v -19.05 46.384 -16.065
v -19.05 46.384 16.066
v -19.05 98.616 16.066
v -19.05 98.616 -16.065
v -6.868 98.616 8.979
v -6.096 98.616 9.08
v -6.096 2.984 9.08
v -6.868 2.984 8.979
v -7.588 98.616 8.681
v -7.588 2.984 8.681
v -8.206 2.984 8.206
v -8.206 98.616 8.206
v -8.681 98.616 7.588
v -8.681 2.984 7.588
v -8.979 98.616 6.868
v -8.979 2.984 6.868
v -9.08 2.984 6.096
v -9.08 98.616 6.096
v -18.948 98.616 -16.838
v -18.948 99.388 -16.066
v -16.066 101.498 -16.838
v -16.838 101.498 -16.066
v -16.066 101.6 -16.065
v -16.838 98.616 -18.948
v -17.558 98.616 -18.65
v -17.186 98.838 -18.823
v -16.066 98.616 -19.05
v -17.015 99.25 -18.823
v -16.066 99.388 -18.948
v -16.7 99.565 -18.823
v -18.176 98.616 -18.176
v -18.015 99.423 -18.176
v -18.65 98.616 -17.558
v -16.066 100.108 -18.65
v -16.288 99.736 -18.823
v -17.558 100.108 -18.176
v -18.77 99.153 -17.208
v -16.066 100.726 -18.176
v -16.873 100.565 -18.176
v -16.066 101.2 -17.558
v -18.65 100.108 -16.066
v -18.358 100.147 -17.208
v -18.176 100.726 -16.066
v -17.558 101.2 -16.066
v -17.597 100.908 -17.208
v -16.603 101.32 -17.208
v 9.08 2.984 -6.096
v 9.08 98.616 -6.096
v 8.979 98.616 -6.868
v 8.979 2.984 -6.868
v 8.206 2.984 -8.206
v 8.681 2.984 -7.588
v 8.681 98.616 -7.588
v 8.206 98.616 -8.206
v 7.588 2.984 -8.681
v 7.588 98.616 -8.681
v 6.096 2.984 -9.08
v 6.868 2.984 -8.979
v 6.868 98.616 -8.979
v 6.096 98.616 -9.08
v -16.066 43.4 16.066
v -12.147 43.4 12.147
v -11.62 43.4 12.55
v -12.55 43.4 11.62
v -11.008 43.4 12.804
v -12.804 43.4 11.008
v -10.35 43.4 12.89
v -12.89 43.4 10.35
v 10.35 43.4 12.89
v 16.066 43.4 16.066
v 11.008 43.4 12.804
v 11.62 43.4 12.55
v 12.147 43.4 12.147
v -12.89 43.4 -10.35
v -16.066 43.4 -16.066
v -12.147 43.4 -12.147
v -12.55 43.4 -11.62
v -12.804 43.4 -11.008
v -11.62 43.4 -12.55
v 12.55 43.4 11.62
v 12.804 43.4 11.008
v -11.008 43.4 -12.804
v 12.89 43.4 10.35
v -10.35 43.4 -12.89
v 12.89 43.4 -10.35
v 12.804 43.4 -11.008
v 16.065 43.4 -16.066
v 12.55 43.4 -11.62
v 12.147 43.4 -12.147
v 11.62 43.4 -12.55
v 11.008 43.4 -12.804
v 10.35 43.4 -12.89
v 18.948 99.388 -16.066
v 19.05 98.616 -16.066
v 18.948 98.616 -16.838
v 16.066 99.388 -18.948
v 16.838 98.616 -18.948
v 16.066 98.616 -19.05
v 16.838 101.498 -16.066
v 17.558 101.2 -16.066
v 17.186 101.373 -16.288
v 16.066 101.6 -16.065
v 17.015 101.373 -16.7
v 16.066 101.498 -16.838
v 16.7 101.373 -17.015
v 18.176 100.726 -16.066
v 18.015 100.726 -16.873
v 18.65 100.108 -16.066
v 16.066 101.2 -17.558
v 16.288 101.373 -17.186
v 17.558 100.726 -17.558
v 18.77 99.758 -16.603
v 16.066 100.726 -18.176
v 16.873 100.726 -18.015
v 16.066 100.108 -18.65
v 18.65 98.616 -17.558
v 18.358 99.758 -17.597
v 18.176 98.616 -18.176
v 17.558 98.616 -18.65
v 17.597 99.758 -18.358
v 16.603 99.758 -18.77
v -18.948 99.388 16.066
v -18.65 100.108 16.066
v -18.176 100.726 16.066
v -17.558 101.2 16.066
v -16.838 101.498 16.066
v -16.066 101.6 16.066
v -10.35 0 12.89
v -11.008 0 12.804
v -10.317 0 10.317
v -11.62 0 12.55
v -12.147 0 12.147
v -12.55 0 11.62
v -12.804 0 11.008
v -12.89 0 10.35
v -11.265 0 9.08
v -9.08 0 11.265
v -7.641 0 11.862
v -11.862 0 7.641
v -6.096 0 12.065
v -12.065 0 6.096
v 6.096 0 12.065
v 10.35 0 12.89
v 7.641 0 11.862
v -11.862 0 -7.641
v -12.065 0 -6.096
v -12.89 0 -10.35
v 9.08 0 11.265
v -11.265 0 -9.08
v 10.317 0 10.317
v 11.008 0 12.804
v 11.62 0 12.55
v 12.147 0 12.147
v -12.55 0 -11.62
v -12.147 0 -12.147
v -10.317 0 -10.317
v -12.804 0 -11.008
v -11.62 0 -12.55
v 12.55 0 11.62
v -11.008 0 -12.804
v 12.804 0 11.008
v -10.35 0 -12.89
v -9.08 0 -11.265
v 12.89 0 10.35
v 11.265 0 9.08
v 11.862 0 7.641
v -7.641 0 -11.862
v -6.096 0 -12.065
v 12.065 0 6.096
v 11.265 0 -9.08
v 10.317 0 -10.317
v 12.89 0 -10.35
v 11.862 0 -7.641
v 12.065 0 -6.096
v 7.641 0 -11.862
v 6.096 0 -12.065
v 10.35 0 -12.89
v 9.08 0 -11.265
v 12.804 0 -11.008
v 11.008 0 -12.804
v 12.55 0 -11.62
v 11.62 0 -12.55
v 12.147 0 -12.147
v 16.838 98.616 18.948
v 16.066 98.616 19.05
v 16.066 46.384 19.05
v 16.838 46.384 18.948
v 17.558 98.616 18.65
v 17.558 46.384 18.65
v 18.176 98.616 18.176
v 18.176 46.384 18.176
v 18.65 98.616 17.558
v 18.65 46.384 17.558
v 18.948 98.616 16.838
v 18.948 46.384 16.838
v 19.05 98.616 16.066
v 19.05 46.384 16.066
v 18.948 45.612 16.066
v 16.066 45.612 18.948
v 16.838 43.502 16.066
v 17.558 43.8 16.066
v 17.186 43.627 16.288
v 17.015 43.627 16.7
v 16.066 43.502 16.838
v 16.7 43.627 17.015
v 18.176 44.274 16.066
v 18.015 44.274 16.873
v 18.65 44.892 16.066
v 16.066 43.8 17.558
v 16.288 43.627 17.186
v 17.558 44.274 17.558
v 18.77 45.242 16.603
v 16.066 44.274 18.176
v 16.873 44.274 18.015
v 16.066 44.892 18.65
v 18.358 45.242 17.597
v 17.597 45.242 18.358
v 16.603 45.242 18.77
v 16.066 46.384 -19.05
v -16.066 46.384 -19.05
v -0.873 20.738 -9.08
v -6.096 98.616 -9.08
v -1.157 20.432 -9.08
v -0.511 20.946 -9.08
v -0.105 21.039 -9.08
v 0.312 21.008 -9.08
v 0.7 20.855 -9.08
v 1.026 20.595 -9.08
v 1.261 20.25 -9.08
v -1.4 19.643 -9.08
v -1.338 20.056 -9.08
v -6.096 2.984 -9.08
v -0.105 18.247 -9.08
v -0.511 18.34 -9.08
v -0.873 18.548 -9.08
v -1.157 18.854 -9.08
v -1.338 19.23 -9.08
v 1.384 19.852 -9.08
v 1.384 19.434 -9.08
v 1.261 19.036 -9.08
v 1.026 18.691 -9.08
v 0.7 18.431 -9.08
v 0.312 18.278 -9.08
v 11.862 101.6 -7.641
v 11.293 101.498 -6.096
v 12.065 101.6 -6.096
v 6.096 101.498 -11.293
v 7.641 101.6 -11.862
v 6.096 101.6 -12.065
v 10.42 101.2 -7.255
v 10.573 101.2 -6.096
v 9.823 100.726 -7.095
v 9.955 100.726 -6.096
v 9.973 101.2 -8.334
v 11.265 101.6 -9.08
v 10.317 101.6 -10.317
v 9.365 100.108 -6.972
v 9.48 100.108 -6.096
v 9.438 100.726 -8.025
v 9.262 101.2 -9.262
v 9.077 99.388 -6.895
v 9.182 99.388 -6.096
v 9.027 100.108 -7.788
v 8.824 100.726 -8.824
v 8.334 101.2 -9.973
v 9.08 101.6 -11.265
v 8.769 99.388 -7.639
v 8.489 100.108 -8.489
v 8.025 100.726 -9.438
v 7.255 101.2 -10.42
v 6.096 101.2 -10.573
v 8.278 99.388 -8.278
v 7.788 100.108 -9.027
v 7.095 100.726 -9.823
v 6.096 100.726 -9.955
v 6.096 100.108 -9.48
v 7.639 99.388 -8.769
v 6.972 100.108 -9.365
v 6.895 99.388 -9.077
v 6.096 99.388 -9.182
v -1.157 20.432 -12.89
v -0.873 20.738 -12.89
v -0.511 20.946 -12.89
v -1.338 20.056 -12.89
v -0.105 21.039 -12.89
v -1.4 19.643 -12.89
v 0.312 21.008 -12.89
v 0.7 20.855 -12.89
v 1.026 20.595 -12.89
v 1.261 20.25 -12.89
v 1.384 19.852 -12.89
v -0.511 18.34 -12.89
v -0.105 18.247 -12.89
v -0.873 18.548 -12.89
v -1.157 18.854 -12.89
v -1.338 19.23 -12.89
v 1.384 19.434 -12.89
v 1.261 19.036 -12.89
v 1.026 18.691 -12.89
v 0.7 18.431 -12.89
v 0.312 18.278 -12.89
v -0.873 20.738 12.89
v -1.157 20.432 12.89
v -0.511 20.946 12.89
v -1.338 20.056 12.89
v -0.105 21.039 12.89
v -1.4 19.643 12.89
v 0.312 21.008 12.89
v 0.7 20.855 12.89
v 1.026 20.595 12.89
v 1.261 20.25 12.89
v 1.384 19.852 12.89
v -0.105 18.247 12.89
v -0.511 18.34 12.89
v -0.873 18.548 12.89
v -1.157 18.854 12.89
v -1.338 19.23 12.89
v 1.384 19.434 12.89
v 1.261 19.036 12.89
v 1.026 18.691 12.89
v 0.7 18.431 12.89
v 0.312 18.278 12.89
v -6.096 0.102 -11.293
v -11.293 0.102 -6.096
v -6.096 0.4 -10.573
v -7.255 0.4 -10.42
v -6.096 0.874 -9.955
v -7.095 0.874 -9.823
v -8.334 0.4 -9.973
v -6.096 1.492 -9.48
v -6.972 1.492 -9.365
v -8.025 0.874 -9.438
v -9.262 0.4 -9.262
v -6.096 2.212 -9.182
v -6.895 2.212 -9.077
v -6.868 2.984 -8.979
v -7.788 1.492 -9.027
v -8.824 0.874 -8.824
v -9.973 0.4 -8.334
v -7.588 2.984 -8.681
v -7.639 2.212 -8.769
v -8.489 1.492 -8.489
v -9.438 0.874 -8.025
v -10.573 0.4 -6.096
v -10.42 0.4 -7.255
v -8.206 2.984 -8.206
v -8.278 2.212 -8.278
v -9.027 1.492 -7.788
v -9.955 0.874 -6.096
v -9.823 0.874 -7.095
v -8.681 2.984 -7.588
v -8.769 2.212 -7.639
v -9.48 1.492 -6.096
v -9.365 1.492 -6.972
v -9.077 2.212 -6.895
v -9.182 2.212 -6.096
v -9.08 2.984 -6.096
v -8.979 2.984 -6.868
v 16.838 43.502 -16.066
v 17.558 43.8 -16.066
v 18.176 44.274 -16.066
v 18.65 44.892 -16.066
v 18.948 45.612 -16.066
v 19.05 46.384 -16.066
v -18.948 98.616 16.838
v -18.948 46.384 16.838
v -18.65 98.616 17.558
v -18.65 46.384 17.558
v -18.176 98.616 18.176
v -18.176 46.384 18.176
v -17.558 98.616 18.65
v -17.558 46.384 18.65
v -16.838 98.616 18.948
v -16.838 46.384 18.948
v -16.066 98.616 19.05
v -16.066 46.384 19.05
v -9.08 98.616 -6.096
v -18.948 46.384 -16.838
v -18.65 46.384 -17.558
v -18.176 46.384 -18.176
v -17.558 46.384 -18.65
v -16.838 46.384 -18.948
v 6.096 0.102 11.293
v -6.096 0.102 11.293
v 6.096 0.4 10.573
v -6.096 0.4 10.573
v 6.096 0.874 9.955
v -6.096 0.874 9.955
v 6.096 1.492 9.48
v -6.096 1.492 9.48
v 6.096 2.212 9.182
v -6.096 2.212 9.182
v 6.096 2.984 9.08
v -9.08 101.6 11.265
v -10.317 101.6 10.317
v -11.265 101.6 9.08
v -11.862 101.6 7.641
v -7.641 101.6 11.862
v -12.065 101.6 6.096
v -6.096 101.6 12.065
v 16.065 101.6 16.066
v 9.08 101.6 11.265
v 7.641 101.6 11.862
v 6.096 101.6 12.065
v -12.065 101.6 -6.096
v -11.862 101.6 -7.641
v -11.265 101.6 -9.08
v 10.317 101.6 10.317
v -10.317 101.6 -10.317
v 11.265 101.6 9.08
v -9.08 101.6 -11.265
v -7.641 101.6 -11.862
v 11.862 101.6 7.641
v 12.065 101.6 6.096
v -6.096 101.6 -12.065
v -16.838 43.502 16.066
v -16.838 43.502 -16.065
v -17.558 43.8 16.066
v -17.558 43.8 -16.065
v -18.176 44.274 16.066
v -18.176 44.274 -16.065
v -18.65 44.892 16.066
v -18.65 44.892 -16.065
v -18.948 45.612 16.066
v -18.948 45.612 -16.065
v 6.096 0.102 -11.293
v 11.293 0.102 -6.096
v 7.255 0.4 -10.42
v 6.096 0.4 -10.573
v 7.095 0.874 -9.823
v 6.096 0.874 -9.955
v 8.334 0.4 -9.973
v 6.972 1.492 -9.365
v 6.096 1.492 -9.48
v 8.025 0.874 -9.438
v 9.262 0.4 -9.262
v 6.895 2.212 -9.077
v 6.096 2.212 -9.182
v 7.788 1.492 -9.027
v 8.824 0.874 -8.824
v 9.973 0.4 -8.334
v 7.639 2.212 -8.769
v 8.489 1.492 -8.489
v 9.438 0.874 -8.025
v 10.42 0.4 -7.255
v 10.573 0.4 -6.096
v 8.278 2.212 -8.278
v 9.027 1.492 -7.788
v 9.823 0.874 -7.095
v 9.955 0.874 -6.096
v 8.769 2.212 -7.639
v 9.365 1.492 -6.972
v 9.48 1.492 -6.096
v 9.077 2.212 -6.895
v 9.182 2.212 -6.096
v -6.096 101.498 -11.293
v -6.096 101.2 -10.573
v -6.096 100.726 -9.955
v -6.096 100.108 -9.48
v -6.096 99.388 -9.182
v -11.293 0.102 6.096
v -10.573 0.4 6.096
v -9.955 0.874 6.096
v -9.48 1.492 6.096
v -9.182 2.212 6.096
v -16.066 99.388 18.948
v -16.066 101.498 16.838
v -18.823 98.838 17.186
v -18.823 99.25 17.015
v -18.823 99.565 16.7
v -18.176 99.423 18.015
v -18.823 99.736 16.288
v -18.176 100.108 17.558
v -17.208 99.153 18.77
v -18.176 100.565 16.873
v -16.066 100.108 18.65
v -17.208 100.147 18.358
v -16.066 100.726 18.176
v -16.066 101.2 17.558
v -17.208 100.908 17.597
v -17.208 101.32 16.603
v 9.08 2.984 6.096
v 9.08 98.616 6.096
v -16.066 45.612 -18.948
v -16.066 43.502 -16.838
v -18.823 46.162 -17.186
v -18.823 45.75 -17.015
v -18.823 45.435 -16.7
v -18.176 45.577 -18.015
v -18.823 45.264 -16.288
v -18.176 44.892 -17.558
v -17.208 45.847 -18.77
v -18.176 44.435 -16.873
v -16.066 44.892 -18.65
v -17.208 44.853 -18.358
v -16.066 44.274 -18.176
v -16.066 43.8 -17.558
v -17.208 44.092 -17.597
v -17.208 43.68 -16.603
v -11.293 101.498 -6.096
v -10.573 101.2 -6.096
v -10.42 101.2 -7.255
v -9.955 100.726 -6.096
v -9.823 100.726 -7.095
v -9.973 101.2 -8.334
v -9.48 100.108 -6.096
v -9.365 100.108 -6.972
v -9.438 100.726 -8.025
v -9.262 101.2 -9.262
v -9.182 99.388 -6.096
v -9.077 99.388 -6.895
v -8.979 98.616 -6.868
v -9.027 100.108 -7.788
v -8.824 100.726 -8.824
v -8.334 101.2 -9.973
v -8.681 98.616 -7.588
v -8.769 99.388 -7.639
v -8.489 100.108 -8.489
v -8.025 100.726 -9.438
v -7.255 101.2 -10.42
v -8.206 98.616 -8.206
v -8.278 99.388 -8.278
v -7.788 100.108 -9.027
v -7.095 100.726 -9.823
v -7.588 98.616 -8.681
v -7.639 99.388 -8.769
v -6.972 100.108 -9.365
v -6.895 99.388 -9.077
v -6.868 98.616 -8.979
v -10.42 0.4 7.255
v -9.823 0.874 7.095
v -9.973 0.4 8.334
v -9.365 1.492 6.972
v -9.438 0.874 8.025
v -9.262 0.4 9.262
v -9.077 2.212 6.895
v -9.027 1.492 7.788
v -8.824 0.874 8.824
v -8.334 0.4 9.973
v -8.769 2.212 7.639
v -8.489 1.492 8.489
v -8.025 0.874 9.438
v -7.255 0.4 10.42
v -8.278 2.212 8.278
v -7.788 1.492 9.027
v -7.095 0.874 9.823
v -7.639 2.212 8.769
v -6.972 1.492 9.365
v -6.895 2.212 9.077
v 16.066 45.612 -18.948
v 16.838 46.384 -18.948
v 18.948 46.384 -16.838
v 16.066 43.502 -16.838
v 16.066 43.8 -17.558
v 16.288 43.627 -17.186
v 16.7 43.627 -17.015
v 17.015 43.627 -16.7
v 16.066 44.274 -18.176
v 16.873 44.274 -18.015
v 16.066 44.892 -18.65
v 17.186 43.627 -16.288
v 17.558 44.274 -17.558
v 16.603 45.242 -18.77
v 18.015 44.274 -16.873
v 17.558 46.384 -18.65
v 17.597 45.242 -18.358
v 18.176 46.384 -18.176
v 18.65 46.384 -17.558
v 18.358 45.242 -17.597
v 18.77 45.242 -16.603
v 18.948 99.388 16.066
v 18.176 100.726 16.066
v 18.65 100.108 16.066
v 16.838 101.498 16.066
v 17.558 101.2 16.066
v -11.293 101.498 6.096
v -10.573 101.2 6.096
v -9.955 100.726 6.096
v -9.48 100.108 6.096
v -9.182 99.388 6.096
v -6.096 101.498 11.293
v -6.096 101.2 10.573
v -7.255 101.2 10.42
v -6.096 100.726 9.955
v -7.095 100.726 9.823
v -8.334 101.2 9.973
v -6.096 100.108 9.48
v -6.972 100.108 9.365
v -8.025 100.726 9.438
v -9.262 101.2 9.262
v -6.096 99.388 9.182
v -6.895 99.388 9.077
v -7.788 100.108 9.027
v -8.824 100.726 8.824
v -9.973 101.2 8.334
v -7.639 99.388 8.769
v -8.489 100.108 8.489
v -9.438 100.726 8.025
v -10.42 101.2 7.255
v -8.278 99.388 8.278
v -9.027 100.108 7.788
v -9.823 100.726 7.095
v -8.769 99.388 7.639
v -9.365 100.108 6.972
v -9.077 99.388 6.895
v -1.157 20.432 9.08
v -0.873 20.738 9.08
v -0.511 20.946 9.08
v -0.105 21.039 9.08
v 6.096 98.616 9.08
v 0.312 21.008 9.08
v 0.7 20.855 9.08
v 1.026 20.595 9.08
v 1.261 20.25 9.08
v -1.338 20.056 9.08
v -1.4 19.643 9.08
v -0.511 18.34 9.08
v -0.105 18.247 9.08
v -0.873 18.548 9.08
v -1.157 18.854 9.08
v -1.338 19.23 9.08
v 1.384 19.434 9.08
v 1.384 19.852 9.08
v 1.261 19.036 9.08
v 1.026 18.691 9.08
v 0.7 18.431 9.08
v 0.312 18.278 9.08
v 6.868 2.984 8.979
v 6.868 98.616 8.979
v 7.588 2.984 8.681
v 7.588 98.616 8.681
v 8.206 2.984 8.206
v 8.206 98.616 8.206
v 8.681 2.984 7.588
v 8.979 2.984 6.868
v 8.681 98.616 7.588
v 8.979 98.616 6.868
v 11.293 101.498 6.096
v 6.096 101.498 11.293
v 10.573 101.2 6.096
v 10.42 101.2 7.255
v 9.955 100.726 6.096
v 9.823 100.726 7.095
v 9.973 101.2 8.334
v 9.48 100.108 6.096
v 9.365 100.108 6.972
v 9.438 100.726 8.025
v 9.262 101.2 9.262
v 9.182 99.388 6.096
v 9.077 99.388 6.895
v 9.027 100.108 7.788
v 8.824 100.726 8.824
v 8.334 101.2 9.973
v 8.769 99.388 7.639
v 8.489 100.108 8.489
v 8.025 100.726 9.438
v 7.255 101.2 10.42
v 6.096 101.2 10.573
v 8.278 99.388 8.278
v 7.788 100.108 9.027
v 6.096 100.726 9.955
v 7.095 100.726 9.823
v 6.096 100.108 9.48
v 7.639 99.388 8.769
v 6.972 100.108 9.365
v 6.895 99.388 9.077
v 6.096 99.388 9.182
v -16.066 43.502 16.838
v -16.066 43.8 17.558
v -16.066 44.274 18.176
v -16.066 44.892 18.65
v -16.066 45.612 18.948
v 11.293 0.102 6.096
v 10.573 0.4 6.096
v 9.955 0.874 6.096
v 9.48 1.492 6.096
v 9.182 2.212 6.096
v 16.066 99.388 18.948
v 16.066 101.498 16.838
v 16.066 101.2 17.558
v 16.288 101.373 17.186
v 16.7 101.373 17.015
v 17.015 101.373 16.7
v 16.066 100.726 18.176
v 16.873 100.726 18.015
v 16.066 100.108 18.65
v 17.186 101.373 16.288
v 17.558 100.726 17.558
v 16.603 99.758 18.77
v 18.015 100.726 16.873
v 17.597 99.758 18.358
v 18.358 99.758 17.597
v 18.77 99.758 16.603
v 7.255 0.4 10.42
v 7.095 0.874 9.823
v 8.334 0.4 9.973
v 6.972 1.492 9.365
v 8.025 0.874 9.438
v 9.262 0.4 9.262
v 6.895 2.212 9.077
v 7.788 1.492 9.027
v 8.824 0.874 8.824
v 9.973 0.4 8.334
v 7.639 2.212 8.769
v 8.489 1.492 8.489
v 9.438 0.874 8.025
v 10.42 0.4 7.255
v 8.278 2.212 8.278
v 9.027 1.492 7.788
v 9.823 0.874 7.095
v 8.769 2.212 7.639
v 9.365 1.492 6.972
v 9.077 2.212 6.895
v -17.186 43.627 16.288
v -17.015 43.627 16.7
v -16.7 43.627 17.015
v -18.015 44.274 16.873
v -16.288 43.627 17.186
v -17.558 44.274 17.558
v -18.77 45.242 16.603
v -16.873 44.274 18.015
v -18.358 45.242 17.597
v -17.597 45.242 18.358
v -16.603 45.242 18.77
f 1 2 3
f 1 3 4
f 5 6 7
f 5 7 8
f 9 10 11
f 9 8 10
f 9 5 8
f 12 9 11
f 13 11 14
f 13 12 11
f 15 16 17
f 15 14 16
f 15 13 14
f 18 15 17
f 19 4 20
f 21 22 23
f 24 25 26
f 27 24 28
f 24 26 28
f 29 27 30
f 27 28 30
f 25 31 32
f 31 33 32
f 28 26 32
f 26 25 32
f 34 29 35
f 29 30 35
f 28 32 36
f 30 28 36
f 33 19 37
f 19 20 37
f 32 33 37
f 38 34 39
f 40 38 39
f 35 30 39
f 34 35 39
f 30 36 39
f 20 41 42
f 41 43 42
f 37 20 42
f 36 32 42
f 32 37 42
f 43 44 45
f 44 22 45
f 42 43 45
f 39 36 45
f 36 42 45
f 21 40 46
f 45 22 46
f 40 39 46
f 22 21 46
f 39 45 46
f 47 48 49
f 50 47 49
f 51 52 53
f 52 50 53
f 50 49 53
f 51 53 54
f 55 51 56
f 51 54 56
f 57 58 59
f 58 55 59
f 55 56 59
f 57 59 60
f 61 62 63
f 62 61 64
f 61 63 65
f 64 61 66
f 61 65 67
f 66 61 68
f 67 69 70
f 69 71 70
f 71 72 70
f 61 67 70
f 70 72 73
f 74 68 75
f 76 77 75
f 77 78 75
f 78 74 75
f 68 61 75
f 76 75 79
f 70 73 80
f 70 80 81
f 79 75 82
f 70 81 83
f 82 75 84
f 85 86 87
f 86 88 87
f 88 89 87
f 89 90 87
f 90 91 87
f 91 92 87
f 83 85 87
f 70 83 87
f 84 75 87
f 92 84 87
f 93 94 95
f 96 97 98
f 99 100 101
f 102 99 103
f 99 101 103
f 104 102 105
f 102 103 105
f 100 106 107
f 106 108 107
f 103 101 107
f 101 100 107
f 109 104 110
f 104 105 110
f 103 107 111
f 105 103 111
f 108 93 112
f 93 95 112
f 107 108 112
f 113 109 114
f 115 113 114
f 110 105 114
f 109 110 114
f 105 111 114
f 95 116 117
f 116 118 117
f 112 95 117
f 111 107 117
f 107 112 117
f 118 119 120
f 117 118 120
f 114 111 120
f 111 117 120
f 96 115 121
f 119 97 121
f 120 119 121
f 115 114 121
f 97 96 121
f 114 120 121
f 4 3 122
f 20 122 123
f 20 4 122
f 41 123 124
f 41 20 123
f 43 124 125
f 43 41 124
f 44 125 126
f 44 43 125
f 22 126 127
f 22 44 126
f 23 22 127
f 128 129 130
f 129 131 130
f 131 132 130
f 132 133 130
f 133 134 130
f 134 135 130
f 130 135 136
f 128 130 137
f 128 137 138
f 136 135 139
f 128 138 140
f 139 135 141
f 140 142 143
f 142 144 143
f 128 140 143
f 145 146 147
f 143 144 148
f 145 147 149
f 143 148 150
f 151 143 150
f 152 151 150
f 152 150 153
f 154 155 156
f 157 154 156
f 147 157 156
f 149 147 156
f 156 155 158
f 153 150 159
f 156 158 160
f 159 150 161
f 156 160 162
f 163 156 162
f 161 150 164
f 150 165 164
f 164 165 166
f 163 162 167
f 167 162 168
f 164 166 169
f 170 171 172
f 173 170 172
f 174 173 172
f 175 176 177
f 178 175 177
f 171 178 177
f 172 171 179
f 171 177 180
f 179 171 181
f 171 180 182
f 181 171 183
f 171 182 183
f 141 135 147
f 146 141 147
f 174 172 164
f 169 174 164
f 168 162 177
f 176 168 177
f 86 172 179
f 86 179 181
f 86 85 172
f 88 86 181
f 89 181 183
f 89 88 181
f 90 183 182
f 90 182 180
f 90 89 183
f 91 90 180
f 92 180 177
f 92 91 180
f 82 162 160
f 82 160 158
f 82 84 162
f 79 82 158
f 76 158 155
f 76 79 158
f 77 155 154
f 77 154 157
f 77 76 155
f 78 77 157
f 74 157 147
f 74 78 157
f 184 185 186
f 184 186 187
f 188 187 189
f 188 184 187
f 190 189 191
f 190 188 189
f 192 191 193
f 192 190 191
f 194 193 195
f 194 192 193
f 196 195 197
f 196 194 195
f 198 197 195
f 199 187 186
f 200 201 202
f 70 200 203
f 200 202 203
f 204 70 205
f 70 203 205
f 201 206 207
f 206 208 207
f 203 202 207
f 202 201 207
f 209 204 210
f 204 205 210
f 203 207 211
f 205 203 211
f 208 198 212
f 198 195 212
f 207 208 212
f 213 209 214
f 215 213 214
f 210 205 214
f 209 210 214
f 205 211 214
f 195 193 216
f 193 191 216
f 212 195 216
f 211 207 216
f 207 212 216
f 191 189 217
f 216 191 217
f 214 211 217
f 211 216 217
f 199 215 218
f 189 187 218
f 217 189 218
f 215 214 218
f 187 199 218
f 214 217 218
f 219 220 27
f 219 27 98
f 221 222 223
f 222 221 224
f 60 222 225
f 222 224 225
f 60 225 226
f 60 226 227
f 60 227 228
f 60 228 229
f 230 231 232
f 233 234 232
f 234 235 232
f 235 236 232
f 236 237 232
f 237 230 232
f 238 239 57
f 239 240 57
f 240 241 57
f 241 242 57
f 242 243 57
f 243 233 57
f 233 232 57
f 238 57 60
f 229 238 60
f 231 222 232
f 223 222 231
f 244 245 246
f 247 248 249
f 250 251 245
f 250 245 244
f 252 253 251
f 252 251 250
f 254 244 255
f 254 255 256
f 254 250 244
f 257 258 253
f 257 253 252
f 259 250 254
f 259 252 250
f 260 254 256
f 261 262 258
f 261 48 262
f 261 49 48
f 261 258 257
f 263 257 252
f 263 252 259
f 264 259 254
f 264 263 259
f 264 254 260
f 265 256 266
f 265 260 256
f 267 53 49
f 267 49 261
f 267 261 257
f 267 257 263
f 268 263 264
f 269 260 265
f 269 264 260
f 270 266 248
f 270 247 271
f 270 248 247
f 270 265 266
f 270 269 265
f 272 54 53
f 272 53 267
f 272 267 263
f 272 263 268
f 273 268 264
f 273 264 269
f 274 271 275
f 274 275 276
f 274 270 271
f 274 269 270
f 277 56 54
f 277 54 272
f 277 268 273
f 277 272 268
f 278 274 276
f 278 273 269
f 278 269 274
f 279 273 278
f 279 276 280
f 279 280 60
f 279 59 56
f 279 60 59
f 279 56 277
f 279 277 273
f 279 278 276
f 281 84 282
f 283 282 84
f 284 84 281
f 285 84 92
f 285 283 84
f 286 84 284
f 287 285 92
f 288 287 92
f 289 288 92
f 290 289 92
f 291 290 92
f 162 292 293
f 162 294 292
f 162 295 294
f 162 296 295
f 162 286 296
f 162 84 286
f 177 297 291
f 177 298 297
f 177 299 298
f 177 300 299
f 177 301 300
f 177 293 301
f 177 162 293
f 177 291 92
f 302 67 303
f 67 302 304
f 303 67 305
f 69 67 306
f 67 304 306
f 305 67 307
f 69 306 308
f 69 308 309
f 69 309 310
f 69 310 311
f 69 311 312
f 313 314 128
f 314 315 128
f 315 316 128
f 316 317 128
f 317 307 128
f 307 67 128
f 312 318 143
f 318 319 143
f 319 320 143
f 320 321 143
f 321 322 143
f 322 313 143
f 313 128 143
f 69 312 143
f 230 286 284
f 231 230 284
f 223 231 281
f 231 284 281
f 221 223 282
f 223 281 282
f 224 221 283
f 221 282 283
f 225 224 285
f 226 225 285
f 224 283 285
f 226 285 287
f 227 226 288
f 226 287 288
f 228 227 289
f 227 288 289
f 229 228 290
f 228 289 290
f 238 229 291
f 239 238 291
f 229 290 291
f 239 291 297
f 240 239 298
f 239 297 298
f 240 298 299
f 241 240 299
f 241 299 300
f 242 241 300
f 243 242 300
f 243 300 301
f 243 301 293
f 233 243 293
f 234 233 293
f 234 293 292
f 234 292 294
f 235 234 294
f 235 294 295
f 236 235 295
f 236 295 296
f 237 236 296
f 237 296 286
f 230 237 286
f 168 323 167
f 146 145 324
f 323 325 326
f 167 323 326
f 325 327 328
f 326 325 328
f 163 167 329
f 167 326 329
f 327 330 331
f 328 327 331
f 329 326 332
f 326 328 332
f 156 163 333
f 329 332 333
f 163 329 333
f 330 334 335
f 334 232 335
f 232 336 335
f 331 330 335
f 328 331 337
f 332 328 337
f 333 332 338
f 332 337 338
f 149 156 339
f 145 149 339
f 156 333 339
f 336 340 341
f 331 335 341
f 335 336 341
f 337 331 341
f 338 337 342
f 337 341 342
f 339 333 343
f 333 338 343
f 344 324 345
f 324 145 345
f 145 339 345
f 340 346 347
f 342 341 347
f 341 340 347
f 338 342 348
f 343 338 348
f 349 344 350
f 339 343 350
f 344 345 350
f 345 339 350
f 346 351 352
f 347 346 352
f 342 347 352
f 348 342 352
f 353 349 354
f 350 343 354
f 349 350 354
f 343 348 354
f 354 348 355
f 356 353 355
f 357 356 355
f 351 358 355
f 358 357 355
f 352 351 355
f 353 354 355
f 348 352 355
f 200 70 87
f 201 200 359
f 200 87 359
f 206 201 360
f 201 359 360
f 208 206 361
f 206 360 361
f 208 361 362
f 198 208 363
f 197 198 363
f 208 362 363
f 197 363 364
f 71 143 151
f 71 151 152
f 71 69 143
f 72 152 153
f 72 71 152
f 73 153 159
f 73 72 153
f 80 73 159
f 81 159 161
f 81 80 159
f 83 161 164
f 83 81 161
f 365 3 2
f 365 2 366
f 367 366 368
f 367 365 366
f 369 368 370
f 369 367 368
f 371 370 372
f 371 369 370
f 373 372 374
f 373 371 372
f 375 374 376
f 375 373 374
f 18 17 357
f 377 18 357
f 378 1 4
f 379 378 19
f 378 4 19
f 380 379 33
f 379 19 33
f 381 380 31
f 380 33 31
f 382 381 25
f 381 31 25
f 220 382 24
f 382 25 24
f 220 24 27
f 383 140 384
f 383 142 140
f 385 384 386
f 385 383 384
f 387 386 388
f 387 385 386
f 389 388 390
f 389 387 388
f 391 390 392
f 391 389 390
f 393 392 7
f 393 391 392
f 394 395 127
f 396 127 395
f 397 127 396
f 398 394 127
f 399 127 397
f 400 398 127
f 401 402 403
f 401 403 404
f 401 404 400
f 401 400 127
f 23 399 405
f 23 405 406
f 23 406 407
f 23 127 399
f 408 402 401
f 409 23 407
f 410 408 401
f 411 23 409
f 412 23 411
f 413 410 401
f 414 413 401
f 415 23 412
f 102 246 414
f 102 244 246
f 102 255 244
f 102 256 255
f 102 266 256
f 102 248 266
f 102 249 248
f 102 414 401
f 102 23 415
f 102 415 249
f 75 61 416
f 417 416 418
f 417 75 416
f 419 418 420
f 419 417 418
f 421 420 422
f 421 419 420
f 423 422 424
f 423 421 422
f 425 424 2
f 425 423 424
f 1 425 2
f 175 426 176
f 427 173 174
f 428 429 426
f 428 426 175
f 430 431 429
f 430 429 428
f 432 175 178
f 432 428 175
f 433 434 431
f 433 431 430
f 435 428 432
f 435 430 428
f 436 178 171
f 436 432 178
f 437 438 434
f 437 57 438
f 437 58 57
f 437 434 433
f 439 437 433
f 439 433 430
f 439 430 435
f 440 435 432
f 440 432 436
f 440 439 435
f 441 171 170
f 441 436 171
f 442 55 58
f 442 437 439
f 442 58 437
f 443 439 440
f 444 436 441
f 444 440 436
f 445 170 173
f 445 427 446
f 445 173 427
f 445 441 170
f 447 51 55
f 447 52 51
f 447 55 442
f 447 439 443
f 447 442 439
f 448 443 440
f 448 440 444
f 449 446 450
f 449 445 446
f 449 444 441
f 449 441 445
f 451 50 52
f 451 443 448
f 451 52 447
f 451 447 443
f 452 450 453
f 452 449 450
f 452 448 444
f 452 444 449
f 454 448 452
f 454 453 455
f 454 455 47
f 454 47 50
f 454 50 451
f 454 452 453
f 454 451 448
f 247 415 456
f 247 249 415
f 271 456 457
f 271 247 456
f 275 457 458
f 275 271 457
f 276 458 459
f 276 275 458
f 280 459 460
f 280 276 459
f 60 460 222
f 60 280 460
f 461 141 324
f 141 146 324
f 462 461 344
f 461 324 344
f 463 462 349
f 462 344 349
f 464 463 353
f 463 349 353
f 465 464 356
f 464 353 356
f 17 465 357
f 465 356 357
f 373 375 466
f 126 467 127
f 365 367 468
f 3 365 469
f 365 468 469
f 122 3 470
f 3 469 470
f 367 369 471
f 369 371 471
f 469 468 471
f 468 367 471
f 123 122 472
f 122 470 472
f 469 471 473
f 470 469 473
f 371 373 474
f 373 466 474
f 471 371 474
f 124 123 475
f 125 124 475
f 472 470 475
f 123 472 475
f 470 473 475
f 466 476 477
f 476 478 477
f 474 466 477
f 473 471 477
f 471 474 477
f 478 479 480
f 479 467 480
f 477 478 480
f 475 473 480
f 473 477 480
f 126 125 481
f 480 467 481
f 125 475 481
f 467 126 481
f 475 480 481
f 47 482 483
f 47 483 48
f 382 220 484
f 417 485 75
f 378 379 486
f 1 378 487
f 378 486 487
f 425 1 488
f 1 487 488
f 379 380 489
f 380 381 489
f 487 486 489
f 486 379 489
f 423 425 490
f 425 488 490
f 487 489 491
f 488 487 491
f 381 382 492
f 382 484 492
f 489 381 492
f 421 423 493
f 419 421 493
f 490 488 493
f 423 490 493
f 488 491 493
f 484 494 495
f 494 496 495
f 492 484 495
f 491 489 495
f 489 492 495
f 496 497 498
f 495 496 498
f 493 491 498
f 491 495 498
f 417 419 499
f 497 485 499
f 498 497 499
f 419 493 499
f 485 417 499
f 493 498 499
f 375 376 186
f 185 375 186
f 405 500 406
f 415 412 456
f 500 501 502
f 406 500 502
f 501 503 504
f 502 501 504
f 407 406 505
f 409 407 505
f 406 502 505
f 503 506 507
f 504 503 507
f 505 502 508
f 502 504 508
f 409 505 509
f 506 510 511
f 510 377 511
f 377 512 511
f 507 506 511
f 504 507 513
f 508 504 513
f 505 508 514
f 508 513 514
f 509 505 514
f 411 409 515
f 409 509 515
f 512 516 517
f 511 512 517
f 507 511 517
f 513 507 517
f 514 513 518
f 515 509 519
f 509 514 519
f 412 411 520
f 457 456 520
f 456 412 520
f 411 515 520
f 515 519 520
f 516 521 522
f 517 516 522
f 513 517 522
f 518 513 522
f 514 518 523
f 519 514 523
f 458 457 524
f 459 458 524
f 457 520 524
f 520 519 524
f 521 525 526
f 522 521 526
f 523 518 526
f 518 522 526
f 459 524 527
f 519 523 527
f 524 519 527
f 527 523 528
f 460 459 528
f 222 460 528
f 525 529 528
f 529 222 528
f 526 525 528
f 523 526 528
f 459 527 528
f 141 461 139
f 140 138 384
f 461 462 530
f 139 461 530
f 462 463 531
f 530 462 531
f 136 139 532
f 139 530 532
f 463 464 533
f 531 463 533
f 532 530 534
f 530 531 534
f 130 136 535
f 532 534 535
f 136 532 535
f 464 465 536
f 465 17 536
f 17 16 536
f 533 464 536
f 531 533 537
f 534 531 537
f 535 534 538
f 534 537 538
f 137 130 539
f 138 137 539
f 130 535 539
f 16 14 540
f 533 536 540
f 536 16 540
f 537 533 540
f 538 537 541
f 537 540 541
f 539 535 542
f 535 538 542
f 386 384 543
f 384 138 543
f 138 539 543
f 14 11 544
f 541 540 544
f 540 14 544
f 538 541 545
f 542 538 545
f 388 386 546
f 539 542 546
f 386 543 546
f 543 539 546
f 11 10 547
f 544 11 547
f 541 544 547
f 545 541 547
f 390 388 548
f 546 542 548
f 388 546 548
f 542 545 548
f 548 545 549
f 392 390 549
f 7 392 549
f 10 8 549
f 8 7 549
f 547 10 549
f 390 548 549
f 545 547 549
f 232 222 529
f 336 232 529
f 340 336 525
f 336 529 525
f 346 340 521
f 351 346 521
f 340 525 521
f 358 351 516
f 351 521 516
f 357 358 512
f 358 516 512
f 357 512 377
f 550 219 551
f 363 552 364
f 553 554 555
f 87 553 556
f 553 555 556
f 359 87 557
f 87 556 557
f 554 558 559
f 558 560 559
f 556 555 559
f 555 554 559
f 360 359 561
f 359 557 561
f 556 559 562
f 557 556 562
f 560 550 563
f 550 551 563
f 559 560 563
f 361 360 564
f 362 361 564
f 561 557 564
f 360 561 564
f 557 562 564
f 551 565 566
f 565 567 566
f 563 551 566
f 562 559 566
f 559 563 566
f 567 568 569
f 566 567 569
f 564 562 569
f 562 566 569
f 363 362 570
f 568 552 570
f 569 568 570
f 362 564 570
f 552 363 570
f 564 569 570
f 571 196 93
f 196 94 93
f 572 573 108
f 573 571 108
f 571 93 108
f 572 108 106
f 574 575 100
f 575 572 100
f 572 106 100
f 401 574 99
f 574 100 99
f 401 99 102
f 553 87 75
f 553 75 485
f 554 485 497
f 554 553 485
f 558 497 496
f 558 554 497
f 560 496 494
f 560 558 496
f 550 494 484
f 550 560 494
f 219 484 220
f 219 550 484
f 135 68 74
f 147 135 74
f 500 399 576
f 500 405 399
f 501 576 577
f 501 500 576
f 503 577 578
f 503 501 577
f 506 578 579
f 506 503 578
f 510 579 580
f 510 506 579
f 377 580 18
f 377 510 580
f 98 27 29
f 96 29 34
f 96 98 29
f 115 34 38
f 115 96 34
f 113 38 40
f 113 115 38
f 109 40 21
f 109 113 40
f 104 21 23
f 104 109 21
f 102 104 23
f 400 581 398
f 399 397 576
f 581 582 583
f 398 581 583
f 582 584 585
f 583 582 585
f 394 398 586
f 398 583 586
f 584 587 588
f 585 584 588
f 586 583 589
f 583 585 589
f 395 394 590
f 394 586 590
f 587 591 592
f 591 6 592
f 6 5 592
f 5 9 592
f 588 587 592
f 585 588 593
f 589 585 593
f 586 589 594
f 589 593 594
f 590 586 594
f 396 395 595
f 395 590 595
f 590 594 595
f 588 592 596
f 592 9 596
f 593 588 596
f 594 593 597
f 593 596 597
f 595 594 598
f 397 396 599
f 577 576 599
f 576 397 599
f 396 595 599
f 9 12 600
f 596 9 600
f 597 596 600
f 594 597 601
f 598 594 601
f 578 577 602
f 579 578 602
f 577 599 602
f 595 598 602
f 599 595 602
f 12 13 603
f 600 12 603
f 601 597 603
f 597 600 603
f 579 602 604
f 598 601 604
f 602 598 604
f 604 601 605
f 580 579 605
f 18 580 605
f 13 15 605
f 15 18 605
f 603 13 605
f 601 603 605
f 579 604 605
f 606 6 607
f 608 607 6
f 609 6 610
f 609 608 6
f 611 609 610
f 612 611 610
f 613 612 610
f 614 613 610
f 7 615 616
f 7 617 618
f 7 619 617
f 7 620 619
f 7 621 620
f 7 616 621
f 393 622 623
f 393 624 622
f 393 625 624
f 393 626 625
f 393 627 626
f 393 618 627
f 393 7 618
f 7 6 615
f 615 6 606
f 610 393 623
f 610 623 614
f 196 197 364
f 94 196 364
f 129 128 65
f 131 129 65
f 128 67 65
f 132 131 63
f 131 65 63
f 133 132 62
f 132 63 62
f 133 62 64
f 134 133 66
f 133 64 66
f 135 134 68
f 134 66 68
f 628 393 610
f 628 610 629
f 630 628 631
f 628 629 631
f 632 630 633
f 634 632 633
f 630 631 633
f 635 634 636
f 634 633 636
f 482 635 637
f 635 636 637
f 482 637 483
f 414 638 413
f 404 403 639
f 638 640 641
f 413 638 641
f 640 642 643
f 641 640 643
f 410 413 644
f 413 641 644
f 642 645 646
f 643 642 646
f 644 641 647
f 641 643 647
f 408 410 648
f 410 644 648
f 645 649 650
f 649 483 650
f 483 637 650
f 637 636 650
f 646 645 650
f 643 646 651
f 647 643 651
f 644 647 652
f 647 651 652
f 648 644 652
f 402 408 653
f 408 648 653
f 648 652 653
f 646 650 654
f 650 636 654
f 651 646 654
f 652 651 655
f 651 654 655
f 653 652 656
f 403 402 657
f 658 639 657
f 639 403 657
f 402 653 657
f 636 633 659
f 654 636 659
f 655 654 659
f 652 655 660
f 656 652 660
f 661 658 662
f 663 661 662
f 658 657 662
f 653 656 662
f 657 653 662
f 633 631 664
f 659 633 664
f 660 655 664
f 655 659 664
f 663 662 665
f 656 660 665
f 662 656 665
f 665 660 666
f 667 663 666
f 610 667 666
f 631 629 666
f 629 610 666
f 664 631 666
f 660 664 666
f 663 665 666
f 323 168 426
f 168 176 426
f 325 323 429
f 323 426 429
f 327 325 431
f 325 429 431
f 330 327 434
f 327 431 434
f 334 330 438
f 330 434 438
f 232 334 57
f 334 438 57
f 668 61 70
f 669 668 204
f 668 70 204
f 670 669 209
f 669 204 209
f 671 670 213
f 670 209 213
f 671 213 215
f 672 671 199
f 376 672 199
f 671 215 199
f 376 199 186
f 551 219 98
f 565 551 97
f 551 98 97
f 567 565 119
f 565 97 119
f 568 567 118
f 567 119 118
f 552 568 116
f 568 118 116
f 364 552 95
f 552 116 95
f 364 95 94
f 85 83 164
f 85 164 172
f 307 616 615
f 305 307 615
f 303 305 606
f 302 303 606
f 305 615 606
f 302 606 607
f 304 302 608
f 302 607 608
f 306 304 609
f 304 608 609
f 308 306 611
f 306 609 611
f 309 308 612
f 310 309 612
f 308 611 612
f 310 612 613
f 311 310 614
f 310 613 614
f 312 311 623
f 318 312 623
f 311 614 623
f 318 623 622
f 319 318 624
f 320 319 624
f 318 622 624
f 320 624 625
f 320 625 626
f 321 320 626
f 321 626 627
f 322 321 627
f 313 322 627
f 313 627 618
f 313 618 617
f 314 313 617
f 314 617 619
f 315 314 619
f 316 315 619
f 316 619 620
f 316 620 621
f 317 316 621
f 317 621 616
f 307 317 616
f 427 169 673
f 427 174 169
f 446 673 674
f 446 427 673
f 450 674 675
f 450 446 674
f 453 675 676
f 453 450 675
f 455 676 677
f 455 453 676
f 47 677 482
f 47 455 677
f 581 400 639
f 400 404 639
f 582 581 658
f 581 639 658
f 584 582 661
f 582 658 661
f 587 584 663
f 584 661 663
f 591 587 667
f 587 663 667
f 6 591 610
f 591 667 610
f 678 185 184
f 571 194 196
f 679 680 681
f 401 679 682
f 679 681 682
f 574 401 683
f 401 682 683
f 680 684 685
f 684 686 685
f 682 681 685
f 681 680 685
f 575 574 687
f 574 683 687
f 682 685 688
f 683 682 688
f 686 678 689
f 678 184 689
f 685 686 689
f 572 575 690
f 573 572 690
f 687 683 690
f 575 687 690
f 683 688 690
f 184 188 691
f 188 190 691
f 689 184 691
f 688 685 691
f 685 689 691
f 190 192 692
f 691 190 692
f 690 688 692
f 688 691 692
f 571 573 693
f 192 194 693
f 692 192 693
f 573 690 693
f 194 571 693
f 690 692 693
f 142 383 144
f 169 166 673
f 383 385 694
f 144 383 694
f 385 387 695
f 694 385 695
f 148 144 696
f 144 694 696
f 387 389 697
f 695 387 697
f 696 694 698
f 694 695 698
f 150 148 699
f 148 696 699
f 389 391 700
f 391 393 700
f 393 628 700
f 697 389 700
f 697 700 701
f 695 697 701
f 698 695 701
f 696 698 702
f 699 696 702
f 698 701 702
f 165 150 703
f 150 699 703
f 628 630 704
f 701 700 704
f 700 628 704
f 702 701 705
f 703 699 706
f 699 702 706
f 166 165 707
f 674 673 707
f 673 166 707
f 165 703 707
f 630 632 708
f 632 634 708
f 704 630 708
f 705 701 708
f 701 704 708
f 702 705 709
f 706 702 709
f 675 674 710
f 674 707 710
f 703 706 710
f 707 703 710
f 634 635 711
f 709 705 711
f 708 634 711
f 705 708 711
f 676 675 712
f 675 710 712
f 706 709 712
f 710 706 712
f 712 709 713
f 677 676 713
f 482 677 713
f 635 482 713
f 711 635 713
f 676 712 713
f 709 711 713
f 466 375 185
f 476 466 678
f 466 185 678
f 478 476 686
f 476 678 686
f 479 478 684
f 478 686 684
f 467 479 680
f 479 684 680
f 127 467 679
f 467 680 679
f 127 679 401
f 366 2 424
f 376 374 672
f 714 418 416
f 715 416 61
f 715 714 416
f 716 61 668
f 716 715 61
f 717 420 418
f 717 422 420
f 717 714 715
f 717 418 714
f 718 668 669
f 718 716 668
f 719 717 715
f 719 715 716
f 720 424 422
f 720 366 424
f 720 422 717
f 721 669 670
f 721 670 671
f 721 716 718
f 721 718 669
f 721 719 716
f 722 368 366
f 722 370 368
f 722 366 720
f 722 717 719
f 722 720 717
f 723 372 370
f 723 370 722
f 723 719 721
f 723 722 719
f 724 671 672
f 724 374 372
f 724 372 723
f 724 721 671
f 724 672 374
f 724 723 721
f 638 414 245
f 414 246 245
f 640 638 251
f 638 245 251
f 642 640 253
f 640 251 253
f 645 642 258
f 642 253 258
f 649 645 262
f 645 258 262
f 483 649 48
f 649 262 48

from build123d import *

# Parameters (mm, degrees)
SKETCH1_W           = 25.781
SKETCH1_H           = 25.781
SKETCH1_W_2         = 18.161
SKETCH1_H_2         = 18.161
BOSS_EXTRUDE1_DEPTH = 101.6
BOSS_EXTRUDE2_START = 43.4
SKETCH1_3_W         = 38.1
SKETCH1_3_H         = 38.1
SKETCH1_3_W_2       = 25.781
SKETCH1_3_H_2       = 25.781
BOSS_EXTRUDE2_DEPTH = 58.2
FILLET1_R           = 2.54
FILLET2_R           = 2.9845
SKETCH2_R           = 1.4
CUT_EXTRUDE1_DEPTH  = 37.592


with BuildPart() as part:
    # Sketch1 → Boss-Extrude1 (new body)
    with BuildSketch(Plane(origin=(0, 0, 0), x_dir=(1, 0, 0), z_dir=(0, 1, 0))):
        Rectangle(SKETCH1_W, SKETCH1_H)
        Rectangle(SKETCH1_W_2, SKETCH1_H_2, mode=Mode.SUBTRACT)
    extrude(amount=BOSS_EXTRUDE1_DEPTH)

    # Sketch1<3> → Boss-Extrude2 (add)
    with BuildSketch(Plane(origin=(0, 0, 0), x_dir=(1, 0, 0), z_dir=(0, 1, 0)).offset(BOSS_EXTRUDE2_START)):
        Rectangle(SKETCH1_3_W, SKETCH1_3_H)
        Rectangle(SKETCH1_3_W_2, SKETCH1_3_H_2, mode=Mode.SUBTRACT)
    extrude(amount=BOSS_EXTRUDE2_DEPTH)

    # Fillet1
    fillet1_edges = [part.edges().sort_by_distance(p)[0] for p in [
        (-12.8905, 21.7, -12.8905),
        (12.8905, 21.7, -12.8905),
        (12.8905, 21.7, 12.8905),
        (-12.8905, 21.7, 12.8905),
    ]]
    fillet(fillet1_edges, radius=FILLET1_R)

    # Fillet2
    fillet2_edges = [part.edges().sort_by_distance(p)[0] for p in [
        (0, 0, 9.0805),
        (9.0805, 0, 0),
        (9.0805, 50.8, -9.0805),
        (-9.0805, 50.8, -9.0805),
        (-9.0805, 50.8, 9.0805),
        (9.0805, 50.8, 9.0805),
        (9.0805, 101.6, 0),
        (0, 101.6, 9.0805),
        (19.05, 72.5, -19.05),
        (0, 43.4, -19.05),
        (19.05, 72.5, 19.05),
        (19.05, 43.4, 0),
        (0, 101.6, 19.05),
        (-19.05, 72.5, 19.05),
        (-19.05, 101.6, 0),
        (-19.05, 72.5, -19.05),
        (-9.0805, 101.6, 0),
        (-19.05, 43.4, 0),
        (0, 43.4, 19.05),
        (19.05, 101.6, 0),
        (0, 101.6, -19.05),
        (0, 101.6, -9.0805),
        (0, 0, -9.0805),
        (-9.0805, 0, 0),
    ]]
    fillet(fillet2_edges, radius=FILLET2_R)

    # Sketch2 → Cut-Extrude1 (cut)
    with BuildSketch(Plane(origin=(0, 0, -12.8905), x_dir=(-1, 0, 0), z_dir=(0, 0, -1))):
        with Locations((0, 19.643054378)):
            Circle(SKETCH2_R)
    extrude(amount=-CUT_EXTRUDE1_DEPTH, mode=Mode.SUBTRACT)


solid = part.part
